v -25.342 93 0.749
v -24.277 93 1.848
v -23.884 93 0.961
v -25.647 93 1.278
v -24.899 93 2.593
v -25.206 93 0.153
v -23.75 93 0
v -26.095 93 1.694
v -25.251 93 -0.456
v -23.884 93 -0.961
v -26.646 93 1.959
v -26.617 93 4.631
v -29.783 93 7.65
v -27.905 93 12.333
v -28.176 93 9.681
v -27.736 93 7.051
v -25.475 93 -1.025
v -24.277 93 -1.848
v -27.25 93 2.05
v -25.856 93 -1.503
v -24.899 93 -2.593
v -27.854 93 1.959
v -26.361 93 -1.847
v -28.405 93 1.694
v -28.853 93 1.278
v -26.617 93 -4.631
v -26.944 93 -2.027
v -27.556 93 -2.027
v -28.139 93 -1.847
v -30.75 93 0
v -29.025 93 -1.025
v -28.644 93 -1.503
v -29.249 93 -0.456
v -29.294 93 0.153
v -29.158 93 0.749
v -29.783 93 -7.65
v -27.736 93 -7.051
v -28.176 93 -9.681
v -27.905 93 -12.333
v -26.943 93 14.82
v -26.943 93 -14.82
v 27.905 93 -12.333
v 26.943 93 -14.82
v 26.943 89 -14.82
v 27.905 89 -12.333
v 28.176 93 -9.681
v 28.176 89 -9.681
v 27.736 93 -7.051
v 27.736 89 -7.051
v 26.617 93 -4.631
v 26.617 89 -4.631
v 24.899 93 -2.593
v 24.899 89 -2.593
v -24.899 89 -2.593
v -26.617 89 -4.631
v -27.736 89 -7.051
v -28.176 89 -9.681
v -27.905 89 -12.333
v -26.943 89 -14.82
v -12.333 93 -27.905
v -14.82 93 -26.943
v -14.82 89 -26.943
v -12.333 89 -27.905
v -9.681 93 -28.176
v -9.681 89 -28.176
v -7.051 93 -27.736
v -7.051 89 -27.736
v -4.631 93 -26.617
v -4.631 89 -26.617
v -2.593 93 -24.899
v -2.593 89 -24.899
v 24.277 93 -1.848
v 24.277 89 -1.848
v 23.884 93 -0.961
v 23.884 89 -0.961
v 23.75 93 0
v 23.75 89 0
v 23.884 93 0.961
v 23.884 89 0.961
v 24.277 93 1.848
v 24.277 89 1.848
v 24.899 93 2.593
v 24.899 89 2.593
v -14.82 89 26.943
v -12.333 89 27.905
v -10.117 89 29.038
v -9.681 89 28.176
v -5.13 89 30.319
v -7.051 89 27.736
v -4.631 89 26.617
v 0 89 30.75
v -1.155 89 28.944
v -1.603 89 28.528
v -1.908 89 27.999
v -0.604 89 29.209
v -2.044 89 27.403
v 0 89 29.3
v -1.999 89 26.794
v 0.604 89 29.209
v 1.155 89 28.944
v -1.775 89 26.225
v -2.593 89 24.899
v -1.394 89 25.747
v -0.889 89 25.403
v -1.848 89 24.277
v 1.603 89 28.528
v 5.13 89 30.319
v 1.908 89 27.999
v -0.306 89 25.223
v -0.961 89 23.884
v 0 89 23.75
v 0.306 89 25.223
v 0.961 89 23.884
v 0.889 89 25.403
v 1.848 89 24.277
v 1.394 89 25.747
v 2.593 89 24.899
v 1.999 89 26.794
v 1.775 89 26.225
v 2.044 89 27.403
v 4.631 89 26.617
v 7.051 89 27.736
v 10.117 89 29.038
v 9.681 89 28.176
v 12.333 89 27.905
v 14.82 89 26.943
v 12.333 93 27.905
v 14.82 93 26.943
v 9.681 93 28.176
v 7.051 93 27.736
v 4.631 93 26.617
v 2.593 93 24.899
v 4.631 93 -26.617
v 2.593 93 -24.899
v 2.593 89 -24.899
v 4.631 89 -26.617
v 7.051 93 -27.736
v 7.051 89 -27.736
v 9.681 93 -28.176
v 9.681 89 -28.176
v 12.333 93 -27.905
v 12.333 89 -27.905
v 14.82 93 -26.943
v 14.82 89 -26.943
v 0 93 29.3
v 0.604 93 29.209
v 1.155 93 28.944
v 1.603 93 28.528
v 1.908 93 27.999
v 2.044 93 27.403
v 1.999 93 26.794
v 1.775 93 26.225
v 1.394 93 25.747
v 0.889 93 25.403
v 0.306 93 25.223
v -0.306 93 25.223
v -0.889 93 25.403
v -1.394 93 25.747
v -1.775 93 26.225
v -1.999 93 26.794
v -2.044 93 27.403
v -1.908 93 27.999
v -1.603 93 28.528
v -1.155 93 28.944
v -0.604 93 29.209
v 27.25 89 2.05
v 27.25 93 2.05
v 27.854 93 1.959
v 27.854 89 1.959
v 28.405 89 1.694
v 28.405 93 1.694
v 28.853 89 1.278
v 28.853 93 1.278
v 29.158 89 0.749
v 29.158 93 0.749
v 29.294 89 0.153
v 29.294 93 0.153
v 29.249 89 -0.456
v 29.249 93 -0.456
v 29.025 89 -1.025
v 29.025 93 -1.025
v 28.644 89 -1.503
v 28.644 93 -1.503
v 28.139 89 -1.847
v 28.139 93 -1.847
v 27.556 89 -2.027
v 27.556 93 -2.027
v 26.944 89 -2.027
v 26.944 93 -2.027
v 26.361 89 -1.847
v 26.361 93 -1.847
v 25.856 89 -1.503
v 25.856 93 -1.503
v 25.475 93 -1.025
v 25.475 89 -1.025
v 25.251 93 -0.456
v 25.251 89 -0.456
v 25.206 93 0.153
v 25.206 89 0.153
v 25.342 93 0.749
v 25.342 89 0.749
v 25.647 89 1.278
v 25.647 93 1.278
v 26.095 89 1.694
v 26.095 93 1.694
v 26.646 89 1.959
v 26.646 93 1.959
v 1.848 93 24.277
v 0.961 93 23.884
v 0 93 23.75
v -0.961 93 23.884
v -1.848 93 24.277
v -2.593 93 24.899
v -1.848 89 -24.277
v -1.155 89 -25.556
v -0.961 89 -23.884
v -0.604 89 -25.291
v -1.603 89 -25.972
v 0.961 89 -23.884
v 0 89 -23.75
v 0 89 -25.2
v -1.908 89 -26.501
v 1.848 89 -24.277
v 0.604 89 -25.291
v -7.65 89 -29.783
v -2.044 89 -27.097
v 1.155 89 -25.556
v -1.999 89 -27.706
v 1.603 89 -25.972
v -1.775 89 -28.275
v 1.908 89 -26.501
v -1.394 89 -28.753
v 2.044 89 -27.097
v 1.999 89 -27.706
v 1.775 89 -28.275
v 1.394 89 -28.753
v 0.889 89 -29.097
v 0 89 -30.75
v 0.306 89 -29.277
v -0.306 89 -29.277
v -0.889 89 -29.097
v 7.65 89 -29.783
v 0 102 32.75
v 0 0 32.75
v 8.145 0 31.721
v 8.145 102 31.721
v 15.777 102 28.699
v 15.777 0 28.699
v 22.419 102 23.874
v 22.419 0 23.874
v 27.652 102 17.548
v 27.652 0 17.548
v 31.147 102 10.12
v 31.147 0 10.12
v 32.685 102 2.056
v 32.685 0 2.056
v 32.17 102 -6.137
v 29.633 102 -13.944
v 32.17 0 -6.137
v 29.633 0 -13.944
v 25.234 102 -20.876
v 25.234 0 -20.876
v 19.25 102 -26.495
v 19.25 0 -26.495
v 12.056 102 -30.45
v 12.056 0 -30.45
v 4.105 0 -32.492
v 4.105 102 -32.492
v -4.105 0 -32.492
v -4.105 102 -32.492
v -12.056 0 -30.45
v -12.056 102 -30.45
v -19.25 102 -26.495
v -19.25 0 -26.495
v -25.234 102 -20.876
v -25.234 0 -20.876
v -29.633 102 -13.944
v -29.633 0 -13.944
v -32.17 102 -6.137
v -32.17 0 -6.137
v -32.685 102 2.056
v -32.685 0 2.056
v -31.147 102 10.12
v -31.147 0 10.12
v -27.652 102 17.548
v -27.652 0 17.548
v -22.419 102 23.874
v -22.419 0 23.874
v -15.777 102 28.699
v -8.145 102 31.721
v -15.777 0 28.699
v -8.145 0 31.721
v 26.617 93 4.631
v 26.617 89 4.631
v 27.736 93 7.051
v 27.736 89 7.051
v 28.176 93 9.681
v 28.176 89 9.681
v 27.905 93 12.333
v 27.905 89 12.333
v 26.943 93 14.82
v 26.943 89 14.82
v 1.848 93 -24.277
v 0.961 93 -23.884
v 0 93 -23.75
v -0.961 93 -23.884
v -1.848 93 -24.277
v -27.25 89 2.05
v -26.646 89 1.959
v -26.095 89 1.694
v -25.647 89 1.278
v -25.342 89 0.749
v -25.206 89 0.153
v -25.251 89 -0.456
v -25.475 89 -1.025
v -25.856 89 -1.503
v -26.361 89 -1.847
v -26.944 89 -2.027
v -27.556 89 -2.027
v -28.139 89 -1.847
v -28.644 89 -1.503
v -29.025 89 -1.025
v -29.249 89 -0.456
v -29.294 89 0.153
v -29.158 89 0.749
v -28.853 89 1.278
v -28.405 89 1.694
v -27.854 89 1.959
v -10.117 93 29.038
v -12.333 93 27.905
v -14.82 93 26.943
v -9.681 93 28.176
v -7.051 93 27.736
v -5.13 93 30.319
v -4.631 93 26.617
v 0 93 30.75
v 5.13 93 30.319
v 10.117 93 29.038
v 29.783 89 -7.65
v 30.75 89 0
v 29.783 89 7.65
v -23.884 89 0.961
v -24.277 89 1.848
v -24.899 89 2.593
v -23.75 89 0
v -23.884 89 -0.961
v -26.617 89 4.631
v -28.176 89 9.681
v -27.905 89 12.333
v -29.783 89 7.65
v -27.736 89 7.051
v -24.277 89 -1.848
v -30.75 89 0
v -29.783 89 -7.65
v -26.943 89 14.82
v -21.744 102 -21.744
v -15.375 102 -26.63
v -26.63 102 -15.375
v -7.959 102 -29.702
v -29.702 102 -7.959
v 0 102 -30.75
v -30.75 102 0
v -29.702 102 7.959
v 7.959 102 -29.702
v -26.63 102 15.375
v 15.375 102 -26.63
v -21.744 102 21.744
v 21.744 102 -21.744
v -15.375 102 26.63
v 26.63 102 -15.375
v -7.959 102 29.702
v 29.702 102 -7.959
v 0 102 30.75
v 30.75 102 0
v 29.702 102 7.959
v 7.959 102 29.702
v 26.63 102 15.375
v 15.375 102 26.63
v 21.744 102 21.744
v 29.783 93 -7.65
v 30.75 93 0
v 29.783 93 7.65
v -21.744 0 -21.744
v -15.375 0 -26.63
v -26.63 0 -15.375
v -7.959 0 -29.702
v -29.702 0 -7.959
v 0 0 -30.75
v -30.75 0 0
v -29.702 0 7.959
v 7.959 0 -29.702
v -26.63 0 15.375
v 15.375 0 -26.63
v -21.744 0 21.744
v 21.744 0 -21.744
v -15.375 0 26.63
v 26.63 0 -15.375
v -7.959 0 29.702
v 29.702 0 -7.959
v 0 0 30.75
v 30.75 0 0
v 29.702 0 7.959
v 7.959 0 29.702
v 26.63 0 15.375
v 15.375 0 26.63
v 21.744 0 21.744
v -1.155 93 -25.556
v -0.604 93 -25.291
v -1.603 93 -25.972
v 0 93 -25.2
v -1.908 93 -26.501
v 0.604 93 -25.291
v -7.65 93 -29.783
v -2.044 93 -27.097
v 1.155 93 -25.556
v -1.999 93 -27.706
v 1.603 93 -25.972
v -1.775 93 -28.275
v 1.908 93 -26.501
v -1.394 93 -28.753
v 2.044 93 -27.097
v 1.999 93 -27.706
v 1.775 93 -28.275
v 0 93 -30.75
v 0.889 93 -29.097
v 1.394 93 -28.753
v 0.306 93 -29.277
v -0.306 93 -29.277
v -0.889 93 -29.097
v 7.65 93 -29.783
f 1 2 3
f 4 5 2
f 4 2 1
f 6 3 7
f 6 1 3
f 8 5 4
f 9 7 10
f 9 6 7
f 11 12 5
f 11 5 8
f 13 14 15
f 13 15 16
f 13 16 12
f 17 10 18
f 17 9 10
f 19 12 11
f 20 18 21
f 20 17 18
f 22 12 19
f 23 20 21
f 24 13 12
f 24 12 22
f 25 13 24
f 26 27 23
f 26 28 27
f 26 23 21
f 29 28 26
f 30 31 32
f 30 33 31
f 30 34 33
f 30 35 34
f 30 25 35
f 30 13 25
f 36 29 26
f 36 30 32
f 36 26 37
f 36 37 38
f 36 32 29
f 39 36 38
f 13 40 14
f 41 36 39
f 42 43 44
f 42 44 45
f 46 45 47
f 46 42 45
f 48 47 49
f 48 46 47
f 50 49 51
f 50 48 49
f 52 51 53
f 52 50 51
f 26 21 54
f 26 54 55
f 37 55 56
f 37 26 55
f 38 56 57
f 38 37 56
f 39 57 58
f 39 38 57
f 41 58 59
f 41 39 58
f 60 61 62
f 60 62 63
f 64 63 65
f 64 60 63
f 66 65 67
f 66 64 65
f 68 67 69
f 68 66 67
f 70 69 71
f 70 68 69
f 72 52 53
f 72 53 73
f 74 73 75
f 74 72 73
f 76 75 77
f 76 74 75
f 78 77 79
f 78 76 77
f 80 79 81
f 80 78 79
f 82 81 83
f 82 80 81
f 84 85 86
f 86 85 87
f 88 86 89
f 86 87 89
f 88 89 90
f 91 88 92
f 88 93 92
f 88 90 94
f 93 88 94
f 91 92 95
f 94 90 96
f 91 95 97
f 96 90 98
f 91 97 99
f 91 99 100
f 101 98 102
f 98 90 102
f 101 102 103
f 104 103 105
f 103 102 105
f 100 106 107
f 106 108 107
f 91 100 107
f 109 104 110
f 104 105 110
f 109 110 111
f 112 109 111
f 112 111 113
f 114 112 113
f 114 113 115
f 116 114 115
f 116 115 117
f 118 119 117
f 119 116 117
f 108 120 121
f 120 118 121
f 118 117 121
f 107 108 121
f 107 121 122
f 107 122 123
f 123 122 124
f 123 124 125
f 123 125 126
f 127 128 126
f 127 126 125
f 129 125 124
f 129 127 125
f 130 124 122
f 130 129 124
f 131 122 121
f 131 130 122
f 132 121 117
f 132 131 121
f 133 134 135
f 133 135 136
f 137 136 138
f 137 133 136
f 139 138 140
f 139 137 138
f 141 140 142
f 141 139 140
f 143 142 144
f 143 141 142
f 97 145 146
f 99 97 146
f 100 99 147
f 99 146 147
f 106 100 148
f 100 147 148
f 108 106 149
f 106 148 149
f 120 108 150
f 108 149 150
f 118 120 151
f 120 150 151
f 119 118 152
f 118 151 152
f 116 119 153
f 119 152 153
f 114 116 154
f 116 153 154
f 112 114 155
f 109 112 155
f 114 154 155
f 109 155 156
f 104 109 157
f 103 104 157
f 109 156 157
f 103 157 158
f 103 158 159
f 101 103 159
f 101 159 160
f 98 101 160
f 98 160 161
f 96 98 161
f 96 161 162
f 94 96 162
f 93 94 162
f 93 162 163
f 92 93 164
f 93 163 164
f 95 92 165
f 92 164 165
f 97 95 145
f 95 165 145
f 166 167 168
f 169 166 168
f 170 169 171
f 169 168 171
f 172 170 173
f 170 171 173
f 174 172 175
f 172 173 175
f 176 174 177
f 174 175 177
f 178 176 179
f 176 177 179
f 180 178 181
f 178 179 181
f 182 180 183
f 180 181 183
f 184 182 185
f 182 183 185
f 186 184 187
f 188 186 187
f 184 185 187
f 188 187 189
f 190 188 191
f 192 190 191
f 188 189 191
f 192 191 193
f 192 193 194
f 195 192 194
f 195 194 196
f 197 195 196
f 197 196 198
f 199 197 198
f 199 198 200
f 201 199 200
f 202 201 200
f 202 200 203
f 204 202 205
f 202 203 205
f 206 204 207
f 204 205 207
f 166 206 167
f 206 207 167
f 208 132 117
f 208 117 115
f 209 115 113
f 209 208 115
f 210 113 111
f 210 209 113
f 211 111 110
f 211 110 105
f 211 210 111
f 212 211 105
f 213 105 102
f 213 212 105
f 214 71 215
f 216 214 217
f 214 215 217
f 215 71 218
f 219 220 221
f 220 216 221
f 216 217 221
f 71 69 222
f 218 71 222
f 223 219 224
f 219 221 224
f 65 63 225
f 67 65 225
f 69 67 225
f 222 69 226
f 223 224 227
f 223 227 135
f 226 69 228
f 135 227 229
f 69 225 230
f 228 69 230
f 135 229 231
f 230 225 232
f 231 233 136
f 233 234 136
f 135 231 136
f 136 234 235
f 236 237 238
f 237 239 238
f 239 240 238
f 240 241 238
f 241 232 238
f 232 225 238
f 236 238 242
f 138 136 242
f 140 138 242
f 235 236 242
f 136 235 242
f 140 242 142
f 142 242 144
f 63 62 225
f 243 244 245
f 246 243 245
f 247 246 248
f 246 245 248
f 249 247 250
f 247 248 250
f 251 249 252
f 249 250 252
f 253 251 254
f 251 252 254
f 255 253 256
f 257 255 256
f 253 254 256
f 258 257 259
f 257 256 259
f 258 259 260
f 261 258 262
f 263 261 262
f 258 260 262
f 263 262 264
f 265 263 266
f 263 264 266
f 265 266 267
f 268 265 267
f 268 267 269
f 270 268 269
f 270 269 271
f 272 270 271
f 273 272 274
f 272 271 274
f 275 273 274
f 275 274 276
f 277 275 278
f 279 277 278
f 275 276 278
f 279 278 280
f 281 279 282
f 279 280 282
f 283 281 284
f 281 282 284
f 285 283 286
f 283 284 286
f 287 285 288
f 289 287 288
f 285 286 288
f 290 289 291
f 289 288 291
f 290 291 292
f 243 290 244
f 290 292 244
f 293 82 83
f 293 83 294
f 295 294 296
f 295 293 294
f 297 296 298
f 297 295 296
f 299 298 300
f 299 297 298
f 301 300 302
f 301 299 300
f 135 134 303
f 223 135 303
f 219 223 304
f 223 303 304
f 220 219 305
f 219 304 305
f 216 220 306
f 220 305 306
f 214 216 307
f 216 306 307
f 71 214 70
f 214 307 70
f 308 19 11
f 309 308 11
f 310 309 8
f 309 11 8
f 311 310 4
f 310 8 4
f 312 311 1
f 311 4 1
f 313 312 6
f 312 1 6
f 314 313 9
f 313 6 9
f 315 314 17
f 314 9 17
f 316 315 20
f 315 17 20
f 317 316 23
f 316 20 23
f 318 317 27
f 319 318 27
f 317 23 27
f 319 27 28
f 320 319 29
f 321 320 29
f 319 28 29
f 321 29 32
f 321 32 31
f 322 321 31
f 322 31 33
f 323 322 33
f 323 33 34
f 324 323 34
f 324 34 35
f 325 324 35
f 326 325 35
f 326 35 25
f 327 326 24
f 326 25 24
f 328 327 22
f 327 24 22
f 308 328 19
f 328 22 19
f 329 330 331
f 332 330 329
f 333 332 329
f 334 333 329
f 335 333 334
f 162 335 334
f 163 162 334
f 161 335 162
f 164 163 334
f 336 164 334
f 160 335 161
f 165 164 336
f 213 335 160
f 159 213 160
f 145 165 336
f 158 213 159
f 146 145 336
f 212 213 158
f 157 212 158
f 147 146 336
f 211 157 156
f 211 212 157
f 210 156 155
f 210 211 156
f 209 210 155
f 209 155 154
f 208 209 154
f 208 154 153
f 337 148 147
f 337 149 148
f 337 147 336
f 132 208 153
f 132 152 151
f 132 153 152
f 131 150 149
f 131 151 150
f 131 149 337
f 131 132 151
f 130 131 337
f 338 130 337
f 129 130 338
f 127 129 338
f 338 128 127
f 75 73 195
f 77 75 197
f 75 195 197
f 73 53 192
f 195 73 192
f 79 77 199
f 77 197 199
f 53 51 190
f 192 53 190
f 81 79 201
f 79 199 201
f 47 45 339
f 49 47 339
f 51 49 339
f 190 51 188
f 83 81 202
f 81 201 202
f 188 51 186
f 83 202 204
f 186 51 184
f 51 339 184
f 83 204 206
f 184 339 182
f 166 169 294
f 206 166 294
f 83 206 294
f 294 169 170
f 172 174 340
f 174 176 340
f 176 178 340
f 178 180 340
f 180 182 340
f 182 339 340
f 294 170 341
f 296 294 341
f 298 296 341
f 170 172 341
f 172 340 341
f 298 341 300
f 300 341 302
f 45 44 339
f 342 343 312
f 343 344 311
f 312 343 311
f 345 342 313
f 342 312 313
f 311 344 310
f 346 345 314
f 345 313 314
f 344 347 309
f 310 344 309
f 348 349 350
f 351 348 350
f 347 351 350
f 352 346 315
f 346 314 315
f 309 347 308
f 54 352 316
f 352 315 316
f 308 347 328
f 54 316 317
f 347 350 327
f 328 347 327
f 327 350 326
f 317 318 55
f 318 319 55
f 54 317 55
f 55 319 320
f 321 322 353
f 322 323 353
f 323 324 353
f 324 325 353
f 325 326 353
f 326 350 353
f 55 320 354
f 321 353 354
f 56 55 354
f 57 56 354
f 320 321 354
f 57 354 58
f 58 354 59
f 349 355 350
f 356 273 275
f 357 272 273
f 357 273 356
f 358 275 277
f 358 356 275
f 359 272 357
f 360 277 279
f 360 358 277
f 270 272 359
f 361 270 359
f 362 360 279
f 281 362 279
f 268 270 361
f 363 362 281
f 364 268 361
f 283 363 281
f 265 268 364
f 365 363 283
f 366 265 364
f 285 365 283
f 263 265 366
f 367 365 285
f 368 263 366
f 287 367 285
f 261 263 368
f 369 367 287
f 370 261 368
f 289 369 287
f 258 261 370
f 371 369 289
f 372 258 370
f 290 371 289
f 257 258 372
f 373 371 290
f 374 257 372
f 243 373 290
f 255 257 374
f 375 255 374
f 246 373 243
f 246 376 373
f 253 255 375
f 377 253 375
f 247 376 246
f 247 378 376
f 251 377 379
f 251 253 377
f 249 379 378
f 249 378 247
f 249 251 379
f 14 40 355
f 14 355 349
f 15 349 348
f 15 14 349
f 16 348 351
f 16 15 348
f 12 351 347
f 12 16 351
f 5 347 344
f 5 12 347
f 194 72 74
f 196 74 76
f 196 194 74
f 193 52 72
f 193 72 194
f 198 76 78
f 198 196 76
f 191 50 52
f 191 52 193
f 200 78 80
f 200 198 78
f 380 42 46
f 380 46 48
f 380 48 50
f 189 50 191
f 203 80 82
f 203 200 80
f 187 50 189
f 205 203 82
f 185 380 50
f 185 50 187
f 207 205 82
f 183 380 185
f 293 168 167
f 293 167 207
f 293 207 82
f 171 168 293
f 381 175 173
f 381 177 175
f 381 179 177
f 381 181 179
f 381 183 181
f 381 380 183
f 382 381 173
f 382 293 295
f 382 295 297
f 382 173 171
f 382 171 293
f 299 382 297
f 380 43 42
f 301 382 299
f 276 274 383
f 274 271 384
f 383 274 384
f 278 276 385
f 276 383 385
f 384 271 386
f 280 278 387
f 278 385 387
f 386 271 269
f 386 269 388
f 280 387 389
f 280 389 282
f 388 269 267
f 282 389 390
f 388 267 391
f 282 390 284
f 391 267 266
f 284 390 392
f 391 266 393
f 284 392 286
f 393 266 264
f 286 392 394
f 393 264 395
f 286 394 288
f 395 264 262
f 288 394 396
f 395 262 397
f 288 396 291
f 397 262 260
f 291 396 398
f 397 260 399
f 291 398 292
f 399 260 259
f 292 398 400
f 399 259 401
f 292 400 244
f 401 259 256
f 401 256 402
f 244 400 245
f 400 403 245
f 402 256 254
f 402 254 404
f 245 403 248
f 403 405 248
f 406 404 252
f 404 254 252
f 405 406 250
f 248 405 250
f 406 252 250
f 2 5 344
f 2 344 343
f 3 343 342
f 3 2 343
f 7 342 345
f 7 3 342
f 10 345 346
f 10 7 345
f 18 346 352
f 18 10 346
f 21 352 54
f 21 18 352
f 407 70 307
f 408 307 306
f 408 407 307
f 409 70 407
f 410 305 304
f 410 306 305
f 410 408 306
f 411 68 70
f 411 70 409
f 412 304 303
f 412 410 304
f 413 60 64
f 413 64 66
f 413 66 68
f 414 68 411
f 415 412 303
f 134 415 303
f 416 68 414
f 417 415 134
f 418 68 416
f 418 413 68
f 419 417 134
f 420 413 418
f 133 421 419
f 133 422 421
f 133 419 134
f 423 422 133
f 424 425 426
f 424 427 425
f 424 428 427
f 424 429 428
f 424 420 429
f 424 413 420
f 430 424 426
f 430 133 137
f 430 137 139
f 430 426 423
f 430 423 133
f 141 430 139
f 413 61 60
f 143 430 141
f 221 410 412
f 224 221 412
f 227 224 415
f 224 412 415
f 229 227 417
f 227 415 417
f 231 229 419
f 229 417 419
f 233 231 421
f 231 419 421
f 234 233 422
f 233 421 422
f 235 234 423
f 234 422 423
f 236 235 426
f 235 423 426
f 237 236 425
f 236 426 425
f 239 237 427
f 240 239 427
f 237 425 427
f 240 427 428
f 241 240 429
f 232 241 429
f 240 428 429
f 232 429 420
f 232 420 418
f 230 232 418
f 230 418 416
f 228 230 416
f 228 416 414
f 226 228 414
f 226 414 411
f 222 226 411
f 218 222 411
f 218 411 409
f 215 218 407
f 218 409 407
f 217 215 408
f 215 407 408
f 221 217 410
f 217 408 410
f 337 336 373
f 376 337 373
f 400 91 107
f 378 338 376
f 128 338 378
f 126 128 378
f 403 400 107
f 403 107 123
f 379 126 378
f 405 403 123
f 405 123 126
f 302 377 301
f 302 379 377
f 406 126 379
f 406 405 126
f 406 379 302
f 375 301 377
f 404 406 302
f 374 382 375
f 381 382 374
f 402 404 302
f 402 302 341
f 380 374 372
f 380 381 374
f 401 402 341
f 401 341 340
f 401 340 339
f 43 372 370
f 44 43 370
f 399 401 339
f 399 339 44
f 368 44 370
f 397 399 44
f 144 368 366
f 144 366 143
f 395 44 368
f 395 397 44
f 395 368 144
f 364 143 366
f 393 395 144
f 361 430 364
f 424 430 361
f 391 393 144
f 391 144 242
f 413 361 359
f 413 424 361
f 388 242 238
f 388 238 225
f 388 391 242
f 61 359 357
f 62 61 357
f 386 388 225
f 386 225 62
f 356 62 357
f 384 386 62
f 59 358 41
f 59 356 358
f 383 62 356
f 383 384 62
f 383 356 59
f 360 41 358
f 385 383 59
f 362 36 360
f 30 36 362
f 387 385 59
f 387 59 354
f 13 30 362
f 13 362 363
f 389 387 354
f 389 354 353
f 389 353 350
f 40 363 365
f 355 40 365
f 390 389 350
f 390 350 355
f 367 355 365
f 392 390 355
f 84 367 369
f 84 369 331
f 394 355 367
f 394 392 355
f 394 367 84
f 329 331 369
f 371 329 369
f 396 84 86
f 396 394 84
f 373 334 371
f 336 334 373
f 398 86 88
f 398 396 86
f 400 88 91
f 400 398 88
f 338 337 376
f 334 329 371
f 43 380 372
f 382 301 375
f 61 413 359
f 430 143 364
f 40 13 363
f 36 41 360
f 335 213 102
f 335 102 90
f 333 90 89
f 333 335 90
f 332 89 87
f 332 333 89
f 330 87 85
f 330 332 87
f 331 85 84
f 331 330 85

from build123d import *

# Parameters (mm, degrees)
SKETCH1_R           = 32.75
SKETCH1_R_2         = 30.75
BOSS_EXTRUDE1_DEPTH = 102
SKETCH3_R           = 2.05
BOSS_EXTRUDE2_DEPTH = 4
FILLET1_R           = 10


with BuildPart() as part:
    # Sketch1 → Boss-Extrude1 (new body)
    with BuildSketch(Plane(origin=(0, 0, 0), x_dir=(1, 0, 0), z_dir=(0, 1, 0))):
        with Locations(Location((0, 0, 0), (0, 0, 270))):
            Circle(SKETCH1_R)
        with Locations(Location((0, 0, 0), (0, 0, 270))):
            Circle(SKETCH1_R_2, mode=Mode.SUBTRACT)
    extrude(amount=BOSS_EXTRUDE1_DEPTH)

    # Sketch3 → Boss-Extrude2 (add)
    # profile 1 of 4: a face of its own
    with BuildSketch(Plane(origin=(0, 93, 0), x_dir=(1, 0, 0), z_dir=(0, 1, 0))):
        with BuildLine():
            Line((-3.5, 27.25), (-3.5, 30.801785663))
            ThreePointArc((-3.5, 30.801785663), (0, 31), (3.5, 30.801785663))
            Line((3.5, 30.801785663), (3.5, 27.25))
            ThreePointArc((3.5, 27.25), (0, 23.75), (-3.5, 27.25))
        make_face()
        with Locations(Location((0, 27.25, 0), (0, 0, 270))):
            Circle(SKETCH3_R, mode=Mode.SUBTRACT)
    # profile 2 of 4: a face of its own
    with BuildSketch(Plane(origin=(0, 93, 0), x_dir=(1, 0, 0), z_dir=(0, 1, 0))):
        with BuildLine():
            Line((27.25, -3.5), (30.801785663, -3.5))
            ThreePointArc((30.801785663, -3.5), (31, 0), (30.801785663, 3.5))
            Line((30.801785663, 3.5), (27.25, 3.5))
            ThreePointArc((27.25, 3.5), (23.75, 0), (27.25, -3.5))
        make_face()
        with Locations(Location((27.25, 0, 0), (0, 0, 270))):
            Circle(SKETCH3_R, mode=Mode.SUBTRACT)
    # profile 3 of 4: a face of its own
    with BuildSketch(Plane(origin=(0, 93, 0), x_dir=(1, 0, 0), z_dir=(0, 1, 0))):
        with BuildLine():
            Line((-3.5, -27.25), (-3.5, -30.801785663))
            ThreePointArc((-3.5, -30.801785663), (0, -31), (3.5, -30.801785663))
            Line((3.5, -30.801785663), (3.5, -27.25))
            ThreePointArc((3.5, -27.25), (0, -23.75), (-3.5, -27.25))
        make_face()
        with Locations(Location((0, -27.25, 0), (0, 0, 270))):
            Circle(SKETCH3_R, mode=Mode.SUBTRACT)
    # profile 4 of 4: a face of its own
    with BuildSketch(Plane(origin=(0, 93, 0), x_dir=(1, 0, 0), z_dir=(0, 1, 0))):
        with BuildLine():
            Line((-27.25, 3.5), (-30.801785663, 3.5))
            ThreePointArc((-30.801785663, 3.5), (-31, 0), (-30.801785663, -3.5))
            Line((-30.801785663, -3.5), (-27.25, -3.5))
            ThreePointArc((-27.25, -3.5), (-23.75, 0), (-27.25, 3.5))
        make_face()
        with Locations(Location((-27.25, 0, 0), (0, 0, 270))):
            Circle(SKETCH3_R, mode=Mode.SUBTRACT)
    extrude(amount=-BOSS_EXTRUDE2_DEPTH)

    # Fillet1
    # the kernel refuses this fillet: 10 mm, written as the material it adds along each edge
    with BuildSketch(Plane(origin=(30.550163666, 93, 3.5), x_dir=(-0.30360135292633833, 0, 0.9527991490872024), z_dir=(0, -1, 0)), Plane(origin=(-3.5, 93, 30.550163666), x_dir=(-0.9527991490872014, 0, -0.30360135292634133), z_dir=(0, -1, 0)), Plane(origin=(-30.550163666, 93, -3.5), x_dir=(0.3036013529263449, 0, -0.9527991490872003), z_dir=(0, -1, 0)), Plane(origin=(3.5, 93, -30.550163666), x_dir=(0.9527991490872035, 0, 0.30360135292633456), z_dir=(0, -1, 0))) as fillet1_piece_1:
        with BuildLine():
            CenterArc((9.948751576, 9.811634042), FILLET1_R, 204.529281699, 76.609121242)
            Line((0.851259395, 5.660051691), (-0.058489823, 5.244893456))
            ThreePointArc((-0.058489823, 5.244893456), (0.049135005, 3.447994485), (-0.952799149, 0.303601353))
            Line((-0.952799149, 0.303601353), (-0.193179642, -0.981163404))
            ThreePointArc((-0.193179642, -0.981163404), (5.940273999, -1.57922532), (12.073727641, -0.981163404))
            Line((12.073727641, -0.981163404), (11.880547998, 0))
        make_face()
    extrude(amount=4)
    with BuildSketch(Plane(origin=(30.550163666, 93, -3.5), x_dir=(-0.3036013529263308, 0, -0.9527991490872049), z_dir=(0, -1, 0)), Plane(origin=(3.5, 93, 30.550163666), x_dir=(0.9527991490872056, 0, -0.3036013529263281), z_dir=(0, -1, 0)), Plane(origin=(-30.550163666, 93, 3.5), x_dir=(0.30360135292632445, 0, 0.9527991490872069), z_dir=(0, -1, 0)), Plane(origin=(-3.5, 93, -30.550163666), x_dir=(-0.9527991490872035, 0, 0.30360135292633467), z_dir=(0, -1, 0))) as fillet1_piece_2:
        with BuildLine():
            CenterArc((9.948751576, -9.811634042), FILLET1_R, 78.861597059, 76.609121242)
            Line((0.851259395, -5.660051691), (-0.058489823, -5.244893456))
            ThreePointArc((-0.058489823, -5.244893456), (0.049135005, -3.447994485), (-0.952799149, -0.303601353))
            Line((-0.952799149, -0.303601353), (-0.193179642, 0.981163404))
            ThreePointArc((-0.193179642, 0.981163404), (5.940273999, 1.57922532), (12.073727641, 0.981163404))
            Line((12.073727641, 0.981163404), (11.880547998, 0))
        make_face()
    extrude(amount=4)


solid = part.part
